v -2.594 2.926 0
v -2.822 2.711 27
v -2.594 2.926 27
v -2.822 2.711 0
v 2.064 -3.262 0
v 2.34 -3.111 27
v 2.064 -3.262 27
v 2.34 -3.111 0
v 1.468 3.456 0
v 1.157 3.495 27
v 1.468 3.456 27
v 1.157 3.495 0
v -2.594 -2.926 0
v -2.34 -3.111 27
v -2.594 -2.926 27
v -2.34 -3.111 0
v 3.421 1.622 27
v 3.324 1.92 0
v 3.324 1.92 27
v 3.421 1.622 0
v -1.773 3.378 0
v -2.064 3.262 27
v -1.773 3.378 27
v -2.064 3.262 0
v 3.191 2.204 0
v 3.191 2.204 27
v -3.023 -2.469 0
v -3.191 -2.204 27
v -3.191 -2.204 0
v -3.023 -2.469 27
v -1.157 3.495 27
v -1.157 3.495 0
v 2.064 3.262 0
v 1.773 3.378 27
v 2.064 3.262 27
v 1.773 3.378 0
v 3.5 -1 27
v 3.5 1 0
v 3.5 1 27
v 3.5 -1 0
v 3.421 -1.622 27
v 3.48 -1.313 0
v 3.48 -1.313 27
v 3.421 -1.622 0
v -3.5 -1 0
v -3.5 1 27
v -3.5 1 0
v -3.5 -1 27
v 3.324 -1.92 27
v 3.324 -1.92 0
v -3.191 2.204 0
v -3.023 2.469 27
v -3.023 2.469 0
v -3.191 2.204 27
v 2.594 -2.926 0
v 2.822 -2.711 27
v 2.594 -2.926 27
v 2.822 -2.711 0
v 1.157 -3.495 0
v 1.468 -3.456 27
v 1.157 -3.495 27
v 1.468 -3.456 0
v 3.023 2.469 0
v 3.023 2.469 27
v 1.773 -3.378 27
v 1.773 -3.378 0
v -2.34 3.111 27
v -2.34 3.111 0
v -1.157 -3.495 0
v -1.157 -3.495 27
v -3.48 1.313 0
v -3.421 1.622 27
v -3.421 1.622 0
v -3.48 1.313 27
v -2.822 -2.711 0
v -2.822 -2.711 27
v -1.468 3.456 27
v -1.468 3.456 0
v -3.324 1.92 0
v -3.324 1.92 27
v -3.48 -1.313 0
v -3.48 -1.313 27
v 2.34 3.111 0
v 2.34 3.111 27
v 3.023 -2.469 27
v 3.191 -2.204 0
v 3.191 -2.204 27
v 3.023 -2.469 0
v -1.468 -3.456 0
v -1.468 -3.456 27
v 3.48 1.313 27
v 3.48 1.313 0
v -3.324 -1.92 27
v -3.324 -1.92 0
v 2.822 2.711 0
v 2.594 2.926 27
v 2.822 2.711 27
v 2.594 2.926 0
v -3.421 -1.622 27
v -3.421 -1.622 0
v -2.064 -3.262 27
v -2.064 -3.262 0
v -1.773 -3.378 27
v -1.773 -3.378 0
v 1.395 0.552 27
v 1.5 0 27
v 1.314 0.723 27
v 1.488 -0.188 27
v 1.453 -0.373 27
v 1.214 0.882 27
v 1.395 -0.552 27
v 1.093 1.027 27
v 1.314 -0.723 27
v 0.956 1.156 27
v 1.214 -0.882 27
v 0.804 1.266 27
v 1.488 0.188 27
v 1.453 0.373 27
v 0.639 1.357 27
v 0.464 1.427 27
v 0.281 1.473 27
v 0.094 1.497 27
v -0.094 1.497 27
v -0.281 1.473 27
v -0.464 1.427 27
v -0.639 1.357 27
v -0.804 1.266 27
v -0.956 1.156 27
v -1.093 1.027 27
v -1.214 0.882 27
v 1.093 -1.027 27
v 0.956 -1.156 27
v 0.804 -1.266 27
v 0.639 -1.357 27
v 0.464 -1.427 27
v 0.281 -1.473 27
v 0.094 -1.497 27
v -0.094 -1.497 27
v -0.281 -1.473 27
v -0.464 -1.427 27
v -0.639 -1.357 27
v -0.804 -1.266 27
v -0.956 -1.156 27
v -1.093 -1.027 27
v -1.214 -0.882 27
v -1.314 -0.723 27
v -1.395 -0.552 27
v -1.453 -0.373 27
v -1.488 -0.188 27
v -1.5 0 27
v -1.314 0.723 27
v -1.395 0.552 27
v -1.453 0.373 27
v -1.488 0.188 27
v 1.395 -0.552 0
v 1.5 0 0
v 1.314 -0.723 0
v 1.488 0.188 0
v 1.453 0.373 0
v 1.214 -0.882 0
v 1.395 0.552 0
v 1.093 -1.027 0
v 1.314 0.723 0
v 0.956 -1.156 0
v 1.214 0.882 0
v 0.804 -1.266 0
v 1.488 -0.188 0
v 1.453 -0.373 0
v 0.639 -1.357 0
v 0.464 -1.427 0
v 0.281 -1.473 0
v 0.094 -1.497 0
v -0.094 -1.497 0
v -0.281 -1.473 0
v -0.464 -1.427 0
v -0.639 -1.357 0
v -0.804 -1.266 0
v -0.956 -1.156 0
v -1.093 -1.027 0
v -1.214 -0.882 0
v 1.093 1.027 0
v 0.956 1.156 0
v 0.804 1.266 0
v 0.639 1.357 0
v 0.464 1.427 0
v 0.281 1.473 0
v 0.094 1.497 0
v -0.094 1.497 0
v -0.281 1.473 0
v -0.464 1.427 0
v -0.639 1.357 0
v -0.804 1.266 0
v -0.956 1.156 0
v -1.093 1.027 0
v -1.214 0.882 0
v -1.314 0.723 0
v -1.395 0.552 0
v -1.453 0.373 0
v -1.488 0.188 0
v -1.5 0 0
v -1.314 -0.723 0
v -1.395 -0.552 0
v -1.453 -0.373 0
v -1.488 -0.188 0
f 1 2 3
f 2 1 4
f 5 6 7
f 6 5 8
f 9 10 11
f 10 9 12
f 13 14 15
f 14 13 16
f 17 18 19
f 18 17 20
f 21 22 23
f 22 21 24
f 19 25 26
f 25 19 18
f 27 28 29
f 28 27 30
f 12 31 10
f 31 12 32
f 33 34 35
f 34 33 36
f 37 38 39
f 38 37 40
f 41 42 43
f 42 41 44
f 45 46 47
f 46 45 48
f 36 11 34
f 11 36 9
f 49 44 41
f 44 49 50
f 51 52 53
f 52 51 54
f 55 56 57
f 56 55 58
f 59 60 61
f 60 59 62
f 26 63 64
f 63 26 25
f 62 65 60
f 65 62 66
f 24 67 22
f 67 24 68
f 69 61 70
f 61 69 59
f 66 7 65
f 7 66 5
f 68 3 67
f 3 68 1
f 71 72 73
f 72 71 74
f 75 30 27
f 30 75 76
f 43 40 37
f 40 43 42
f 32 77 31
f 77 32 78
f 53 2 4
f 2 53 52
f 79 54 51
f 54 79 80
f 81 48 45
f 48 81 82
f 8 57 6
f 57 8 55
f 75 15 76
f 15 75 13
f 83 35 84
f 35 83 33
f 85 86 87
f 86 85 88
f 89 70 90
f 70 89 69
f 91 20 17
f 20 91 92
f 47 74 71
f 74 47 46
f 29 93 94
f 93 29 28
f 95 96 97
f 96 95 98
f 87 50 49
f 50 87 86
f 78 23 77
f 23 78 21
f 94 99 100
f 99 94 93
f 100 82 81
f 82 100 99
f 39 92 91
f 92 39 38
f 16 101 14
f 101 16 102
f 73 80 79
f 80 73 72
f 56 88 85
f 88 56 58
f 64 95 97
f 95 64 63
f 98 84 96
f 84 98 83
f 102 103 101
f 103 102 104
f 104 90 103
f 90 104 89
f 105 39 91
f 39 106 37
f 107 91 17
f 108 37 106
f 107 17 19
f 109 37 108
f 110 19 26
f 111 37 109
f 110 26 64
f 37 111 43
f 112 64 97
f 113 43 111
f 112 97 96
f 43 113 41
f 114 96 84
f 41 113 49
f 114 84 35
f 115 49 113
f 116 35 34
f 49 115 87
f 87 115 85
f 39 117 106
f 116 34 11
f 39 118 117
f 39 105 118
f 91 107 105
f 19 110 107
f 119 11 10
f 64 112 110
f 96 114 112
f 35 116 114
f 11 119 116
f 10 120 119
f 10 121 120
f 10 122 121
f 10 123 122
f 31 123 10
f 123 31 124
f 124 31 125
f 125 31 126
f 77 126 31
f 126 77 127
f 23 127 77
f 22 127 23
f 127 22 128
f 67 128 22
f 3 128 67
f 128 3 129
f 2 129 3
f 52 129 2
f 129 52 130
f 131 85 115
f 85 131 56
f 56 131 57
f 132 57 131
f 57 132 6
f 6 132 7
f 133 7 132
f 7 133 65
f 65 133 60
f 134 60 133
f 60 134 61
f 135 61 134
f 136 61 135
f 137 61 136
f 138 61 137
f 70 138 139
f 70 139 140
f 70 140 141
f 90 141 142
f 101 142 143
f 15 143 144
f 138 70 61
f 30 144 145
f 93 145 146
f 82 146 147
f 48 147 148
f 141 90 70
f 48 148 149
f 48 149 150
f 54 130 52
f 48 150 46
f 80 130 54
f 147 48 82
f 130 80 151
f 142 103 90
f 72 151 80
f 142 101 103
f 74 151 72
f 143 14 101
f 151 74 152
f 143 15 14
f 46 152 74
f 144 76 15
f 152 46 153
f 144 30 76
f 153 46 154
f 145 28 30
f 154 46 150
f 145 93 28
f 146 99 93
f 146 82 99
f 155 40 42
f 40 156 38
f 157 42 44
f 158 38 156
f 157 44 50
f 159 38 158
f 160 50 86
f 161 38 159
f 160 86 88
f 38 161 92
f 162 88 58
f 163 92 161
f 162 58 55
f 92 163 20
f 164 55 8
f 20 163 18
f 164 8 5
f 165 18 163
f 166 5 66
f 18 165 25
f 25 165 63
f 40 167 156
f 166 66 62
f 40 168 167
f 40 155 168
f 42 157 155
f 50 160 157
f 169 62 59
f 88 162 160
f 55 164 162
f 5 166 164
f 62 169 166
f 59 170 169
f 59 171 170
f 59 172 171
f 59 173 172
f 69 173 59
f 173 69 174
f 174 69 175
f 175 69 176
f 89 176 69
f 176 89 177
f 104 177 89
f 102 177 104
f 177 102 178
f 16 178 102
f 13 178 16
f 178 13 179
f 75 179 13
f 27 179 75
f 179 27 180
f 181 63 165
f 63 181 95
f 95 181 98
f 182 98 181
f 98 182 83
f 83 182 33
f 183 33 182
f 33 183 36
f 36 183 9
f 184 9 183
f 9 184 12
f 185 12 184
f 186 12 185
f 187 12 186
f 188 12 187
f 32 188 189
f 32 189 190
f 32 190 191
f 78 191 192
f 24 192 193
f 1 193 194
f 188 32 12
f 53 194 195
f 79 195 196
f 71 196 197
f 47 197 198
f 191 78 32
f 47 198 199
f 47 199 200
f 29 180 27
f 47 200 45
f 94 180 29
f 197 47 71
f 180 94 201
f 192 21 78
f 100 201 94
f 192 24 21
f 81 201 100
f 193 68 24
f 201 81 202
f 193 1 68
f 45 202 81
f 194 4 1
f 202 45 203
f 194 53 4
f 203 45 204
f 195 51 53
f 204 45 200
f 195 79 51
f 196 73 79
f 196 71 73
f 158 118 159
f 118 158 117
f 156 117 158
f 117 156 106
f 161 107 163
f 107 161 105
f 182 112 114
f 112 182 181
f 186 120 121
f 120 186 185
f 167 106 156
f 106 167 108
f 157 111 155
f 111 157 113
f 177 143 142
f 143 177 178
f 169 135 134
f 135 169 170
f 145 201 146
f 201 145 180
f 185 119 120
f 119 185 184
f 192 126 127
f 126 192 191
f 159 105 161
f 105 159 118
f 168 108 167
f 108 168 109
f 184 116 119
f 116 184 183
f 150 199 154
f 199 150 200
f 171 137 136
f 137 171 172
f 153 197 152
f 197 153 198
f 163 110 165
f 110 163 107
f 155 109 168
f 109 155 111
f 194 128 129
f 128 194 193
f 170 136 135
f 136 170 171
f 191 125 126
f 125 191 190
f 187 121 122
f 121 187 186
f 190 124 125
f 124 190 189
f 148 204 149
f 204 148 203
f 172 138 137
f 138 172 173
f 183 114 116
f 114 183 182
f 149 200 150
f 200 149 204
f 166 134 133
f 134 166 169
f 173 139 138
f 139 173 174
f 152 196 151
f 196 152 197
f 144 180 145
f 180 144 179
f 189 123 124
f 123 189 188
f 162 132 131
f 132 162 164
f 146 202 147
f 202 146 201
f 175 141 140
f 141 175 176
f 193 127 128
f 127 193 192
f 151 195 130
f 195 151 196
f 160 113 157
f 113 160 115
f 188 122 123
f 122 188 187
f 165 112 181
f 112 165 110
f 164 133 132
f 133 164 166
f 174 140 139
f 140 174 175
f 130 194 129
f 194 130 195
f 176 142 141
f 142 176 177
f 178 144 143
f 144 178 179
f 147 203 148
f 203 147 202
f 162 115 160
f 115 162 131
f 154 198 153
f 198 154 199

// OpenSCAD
$fn = 50;


difference() {
	union() {
		translate(v = [0, 0, 0]) {
			rotate(a = [0, 0, 0]) {
				hull() {
					translate(v = [-1.0000000000, 1.0000000000, 0]) {
						rotate(a = [0, 0, 0]) {
							translate(v = [0, 0, 0]) {
								rotate(a = [0, 0, 0]) {
									cylinder(h = 27, r = 2.5000000000);
								}
							}
						}
					}
					translate(v = [1.0000000000, 1.0000000000, 0]) {
						rotate(a = [0, 0, 0]) {
							translate(v = [0, 0, 0]) {
								rotate(a = [0, 0, 0]) {
									cylinder(h = 27, r = 2.5000000000);
								}
							}
						}
					}
					translate(v = [-1.0000000000, -1.0000000000, 0]) {
						rotate(a = [0, 0, 0]) {
							translate(v = [0, 0, 0]) {
								rotate(a = [0, 0, 0]) {
									cylinder(h = 27, r = 2.5000000000);
								}
							}
						}
					}
					translate(v = [1.0000000000, -1.0000000000, 0]) {
						rotate(a = [0, 0, 0]) {
							translate(v = [0, 0, 0]) {
								rotate(a = [0, 0, 0]) {
									cylinder(h = 27, r = 2.5000000000);
								}
							}
						}
					}
				}
			}
		}
	}
	union() {
		translate(v = [0.0000000000, 0.0000000000, 0]) {
			rotate(a = [0, 0, 0]) {
				translate(v = [0, 0, -50]) {
					rotate(a = [0, 0, 0]) {
						cylinder(h = 100, r = 1.5000000000);
					}
				}
			}
		}
	}
}
